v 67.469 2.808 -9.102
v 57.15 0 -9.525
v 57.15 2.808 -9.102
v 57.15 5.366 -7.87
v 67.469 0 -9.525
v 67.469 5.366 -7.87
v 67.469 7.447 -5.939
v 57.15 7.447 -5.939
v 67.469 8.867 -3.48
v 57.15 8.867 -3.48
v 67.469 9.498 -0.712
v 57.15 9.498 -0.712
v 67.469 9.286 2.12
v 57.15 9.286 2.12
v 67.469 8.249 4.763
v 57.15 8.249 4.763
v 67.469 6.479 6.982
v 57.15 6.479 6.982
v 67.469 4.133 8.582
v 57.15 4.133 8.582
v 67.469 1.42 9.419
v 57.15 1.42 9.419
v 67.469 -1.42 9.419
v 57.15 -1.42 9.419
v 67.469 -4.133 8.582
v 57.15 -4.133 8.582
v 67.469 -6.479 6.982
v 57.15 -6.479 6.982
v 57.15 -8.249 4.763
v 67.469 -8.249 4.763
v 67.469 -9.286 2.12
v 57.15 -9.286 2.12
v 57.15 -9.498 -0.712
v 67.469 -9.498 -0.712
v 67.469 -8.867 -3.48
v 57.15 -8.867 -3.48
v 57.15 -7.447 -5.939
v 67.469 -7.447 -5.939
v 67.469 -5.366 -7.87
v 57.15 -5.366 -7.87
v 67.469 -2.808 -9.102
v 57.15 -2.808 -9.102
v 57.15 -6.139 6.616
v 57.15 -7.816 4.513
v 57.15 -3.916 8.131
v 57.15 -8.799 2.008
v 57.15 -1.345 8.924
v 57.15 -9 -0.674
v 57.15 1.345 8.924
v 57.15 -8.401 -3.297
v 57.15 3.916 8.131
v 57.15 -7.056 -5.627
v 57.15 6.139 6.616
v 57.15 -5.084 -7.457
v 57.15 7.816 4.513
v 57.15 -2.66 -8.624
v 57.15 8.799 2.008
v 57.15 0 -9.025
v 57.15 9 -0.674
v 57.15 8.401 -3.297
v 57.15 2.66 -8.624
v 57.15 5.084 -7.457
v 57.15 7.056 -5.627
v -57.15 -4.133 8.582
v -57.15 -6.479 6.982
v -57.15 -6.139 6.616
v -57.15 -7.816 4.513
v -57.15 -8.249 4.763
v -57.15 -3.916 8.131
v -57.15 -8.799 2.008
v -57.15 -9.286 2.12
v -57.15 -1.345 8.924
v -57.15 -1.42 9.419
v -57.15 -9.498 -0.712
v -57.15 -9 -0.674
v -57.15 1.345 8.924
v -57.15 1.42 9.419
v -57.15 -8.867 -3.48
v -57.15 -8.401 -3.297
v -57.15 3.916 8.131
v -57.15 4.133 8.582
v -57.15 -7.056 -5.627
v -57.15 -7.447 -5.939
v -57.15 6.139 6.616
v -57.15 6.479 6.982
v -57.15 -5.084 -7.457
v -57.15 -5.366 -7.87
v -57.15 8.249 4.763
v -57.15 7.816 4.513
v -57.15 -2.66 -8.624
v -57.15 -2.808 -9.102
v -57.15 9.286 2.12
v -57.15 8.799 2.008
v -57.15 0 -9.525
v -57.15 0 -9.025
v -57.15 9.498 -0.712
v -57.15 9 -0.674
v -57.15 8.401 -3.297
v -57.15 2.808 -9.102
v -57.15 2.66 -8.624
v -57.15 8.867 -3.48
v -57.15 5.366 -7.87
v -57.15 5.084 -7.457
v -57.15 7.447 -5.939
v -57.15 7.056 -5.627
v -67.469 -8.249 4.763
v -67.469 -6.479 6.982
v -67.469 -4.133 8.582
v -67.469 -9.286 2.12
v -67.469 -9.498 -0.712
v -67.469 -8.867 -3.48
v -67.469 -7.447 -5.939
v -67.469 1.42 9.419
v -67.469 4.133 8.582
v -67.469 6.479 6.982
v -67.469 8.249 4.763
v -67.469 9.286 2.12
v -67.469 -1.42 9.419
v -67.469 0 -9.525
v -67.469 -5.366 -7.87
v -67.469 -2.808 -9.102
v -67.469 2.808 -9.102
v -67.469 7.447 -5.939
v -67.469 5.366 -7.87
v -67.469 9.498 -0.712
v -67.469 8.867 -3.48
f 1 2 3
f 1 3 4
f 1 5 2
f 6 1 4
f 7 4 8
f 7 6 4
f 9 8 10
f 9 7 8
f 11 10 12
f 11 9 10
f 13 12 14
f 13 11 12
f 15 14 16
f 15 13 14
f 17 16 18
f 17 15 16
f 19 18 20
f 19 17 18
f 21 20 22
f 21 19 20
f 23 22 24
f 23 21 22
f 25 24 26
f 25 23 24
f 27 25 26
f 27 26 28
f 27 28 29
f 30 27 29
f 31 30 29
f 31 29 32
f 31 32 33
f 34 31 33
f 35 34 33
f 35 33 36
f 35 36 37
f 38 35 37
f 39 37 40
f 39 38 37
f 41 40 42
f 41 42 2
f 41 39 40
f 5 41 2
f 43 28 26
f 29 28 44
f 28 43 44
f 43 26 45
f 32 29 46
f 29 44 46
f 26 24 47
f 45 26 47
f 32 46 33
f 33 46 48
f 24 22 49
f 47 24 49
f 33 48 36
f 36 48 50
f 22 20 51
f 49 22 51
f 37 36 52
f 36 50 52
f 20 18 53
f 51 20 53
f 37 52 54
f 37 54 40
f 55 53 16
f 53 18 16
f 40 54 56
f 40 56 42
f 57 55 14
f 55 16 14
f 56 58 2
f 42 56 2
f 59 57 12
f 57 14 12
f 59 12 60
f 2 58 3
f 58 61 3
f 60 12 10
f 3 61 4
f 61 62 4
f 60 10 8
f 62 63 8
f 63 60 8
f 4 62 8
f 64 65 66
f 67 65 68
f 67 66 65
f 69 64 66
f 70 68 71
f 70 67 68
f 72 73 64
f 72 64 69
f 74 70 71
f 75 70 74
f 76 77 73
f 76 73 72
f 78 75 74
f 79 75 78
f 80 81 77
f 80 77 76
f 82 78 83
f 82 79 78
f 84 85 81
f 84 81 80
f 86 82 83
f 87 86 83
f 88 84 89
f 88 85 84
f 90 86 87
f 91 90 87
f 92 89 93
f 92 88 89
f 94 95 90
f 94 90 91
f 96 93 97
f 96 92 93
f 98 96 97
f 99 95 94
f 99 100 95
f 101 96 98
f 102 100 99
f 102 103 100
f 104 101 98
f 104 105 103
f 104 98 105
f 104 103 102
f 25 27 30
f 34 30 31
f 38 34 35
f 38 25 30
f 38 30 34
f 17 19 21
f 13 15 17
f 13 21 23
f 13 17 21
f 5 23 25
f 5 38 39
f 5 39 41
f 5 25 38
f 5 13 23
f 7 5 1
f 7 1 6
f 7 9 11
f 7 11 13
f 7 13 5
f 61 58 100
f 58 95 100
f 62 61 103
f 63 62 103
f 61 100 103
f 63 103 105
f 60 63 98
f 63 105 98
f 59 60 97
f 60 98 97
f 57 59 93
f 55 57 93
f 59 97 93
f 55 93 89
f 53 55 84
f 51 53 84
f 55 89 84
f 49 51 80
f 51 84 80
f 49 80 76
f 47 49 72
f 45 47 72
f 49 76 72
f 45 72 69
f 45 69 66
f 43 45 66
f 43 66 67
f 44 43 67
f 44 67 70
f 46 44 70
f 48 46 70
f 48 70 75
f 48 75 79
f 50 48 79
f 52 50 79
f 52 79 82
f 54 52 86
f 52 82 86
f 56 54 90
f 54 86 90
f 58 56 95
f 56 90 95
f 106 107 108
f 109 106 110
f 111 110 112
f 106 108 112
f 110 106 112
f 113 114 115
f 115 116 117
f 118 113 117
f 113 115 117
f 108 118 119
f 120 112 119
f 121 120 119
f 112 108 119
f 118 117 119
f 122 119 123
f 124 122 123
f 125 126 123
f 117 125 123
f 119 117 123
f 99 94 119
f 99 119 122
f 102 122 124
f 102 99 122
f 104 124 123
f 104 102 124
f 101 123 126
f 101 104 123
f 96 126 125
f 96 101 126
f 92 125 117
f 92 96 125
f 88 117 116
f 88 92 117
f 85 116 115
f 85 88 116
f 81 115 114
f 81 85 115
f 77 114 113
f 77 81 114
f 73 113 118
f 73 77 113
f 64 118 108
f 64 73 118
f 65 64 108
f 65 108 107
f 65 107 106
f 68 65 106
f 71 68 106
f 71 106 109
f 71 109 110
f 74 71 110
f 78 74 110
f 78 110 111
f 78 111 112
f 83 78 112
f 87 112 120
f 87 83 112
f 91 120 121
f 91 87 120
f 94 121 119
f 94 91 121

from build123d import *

# Parameters (mm, degrees)
SKETCH1_R           = 9.525
BOSS_EXTRUDE1_DEPTH = 67.46875
SKETCH2_R           = 9.525
SKETCH2_R_2         = 9.025
CUT_EXTRUDE1_DEPTH  = 57.15


with BuildPart() as part:
    # Sketch1 → Boss-Extrude1 (new, symmetric)
    with BuildSketch(Plane(origin=(0, 0, 0), x_dir=(0, 0, -1), z_dir=(1, 0, 0))):
        Circle(SKETCH1_R)
    extrude(amount=BOSS_EXTRUDE1_DEPTH, both=True)

    # Sketch2 → Cut-Extrude1 (cut, symmetric)
    with BuildSketch(Plane(origin=(0, 0, 0), x_dir=(0, 0, -1), z_dir=(1, 0, 0))):
        Circle(SKETCH2_R)
        Circle(SKETCH2_R_2, mode=Mode.SUBTRACT)
    extrude(amount=CUT_EXTRUDE1_DEPTH, both=True, mode=Mode.SUBTRACT)


solid = part.part
